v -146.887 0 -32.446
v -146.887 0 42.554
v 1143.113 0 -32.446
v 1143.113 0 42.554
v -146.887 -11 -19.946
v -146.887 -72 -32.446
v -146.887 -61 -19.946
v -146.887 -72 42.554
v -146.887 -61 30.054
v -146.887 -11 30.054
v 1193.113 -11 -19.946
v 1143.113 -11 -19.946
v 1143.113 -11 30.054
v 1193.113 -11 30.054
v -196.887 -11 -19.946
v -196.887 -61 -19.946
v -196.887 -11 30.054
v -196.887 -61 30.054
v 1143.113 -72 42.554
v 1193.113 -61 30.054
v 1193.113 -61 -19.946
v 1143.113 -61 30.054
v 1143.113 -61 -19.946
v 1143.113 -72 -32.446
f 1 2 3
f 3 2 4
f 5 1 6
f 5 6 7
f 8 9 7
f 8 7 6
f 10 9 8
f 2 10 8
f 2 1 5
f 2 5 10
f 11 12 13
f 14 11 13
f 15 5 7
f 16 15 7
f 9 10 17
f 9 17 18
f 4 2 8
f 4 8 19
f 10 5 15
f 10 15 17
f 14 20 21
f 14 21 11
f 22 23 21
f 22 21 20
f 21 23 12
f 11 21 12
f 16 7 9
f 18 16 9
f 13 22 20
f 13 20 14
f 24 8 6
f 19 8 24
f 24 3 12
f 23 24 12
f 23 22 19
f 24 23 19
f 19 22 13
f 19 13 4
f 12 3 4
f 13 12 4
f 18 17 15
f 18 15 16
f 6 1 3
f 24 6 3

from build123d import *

# Parameters (mm, degrees)
F0_W     = 1290
F0_H     = 75
F1_DEPTH = 72
F2_W     = 50
F2_H     = 50
F3_DEPTH = 50
F4_W     = 50
F4_H     = 50
F5_DEPTH = 50


with BuildPart() as f1:
    # F0 (on Front) → F1 (new body)
    with BuildSketch(Plane.XZ):
        with Locations((498.112862, 5.05404)):
            Rectangle(F0_W, F0_H)
    extrude(amount=F1_DEPTH)

    # F2 (on face) → F3 (join)
    with BuildSketch(Plane.YZ.offset(1143.112862)):
        with Locations((-36, 5.05404)):
            Rectangle(F2_W, F2_H)
    extrude(amount=F3_DEPTH)

    # F4 (on face) → F5 (join)
    with BuildSketch(Plane(origin=(-146.887138, 0, 0), x_dir=(0, -1, 0), z_dir=(-1, 0, 0))):
        with Locations((36, 5.05404)):
            Rectangle(F4_W, F4_H)
    extrude(amount=F5_DEPTH)


solid = f1.part
